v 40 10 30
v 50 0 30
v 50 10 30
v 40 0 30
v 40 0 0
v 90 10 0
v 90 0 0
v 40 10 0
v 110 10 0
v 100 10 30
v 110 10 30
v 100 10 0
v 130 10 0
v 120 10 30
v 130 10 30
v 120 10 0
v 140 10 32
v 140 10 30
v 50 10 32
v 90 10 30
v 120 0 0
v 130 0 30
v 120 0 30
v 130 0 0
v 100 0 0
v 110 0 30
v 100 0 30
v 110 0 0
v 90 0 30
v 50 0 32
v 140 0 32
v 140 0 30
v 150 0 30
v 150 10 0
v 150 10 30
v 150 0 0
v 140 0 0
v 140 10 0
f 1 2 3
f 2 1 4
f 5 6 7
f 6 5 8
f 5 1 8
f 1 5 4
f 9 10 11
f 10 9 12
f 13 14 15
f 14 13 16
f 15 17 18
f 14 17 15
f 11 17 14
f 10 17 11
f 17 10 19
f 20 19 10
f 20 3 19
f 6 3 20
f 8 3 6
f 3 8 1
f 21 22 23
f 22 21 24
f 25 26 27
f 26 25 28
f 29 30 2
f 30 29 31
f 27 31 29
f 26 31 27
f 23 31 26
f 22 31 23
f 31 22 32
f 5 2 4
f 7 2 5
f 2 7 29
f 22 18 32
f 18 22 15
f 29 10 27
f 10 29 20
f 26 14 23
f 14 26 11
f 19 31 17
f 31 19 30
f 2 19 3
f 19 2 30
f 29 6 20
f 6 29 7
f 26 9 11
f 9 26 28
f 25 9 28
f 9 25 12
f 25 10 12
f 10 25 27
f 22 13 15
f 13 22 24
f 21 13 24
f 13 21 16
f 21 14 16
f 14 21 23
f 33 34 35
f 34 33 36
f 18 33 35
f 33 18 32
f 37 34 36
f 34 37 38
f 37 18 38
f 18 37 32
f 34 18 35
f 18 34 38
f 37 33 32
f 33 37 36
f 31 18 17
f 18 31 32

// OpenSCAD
/*
  Bridge ladder: base pillars with spans increasing by step.
*/
span_start = 10;
span_end   = 50;
span_step  = 10;
pillar_w   = 10;
thickness  = 2;
height     = 30;
gap        = 10;

x = 0;
for (s = [span_start:span_step:span_end]){
    // pillars
    translate([x,0,0]) cube([pillar_w, pillar_w, height]);
    translate([x + pillar_w + s,0,0]) cube([pillar_w, pillar_w, height]);
    // bridge
    translate([x + pillar_w, 0, height])
        cube([s, pillar_w, thickness]);
    x = x + pillar_w*2 + s + gap;
}
